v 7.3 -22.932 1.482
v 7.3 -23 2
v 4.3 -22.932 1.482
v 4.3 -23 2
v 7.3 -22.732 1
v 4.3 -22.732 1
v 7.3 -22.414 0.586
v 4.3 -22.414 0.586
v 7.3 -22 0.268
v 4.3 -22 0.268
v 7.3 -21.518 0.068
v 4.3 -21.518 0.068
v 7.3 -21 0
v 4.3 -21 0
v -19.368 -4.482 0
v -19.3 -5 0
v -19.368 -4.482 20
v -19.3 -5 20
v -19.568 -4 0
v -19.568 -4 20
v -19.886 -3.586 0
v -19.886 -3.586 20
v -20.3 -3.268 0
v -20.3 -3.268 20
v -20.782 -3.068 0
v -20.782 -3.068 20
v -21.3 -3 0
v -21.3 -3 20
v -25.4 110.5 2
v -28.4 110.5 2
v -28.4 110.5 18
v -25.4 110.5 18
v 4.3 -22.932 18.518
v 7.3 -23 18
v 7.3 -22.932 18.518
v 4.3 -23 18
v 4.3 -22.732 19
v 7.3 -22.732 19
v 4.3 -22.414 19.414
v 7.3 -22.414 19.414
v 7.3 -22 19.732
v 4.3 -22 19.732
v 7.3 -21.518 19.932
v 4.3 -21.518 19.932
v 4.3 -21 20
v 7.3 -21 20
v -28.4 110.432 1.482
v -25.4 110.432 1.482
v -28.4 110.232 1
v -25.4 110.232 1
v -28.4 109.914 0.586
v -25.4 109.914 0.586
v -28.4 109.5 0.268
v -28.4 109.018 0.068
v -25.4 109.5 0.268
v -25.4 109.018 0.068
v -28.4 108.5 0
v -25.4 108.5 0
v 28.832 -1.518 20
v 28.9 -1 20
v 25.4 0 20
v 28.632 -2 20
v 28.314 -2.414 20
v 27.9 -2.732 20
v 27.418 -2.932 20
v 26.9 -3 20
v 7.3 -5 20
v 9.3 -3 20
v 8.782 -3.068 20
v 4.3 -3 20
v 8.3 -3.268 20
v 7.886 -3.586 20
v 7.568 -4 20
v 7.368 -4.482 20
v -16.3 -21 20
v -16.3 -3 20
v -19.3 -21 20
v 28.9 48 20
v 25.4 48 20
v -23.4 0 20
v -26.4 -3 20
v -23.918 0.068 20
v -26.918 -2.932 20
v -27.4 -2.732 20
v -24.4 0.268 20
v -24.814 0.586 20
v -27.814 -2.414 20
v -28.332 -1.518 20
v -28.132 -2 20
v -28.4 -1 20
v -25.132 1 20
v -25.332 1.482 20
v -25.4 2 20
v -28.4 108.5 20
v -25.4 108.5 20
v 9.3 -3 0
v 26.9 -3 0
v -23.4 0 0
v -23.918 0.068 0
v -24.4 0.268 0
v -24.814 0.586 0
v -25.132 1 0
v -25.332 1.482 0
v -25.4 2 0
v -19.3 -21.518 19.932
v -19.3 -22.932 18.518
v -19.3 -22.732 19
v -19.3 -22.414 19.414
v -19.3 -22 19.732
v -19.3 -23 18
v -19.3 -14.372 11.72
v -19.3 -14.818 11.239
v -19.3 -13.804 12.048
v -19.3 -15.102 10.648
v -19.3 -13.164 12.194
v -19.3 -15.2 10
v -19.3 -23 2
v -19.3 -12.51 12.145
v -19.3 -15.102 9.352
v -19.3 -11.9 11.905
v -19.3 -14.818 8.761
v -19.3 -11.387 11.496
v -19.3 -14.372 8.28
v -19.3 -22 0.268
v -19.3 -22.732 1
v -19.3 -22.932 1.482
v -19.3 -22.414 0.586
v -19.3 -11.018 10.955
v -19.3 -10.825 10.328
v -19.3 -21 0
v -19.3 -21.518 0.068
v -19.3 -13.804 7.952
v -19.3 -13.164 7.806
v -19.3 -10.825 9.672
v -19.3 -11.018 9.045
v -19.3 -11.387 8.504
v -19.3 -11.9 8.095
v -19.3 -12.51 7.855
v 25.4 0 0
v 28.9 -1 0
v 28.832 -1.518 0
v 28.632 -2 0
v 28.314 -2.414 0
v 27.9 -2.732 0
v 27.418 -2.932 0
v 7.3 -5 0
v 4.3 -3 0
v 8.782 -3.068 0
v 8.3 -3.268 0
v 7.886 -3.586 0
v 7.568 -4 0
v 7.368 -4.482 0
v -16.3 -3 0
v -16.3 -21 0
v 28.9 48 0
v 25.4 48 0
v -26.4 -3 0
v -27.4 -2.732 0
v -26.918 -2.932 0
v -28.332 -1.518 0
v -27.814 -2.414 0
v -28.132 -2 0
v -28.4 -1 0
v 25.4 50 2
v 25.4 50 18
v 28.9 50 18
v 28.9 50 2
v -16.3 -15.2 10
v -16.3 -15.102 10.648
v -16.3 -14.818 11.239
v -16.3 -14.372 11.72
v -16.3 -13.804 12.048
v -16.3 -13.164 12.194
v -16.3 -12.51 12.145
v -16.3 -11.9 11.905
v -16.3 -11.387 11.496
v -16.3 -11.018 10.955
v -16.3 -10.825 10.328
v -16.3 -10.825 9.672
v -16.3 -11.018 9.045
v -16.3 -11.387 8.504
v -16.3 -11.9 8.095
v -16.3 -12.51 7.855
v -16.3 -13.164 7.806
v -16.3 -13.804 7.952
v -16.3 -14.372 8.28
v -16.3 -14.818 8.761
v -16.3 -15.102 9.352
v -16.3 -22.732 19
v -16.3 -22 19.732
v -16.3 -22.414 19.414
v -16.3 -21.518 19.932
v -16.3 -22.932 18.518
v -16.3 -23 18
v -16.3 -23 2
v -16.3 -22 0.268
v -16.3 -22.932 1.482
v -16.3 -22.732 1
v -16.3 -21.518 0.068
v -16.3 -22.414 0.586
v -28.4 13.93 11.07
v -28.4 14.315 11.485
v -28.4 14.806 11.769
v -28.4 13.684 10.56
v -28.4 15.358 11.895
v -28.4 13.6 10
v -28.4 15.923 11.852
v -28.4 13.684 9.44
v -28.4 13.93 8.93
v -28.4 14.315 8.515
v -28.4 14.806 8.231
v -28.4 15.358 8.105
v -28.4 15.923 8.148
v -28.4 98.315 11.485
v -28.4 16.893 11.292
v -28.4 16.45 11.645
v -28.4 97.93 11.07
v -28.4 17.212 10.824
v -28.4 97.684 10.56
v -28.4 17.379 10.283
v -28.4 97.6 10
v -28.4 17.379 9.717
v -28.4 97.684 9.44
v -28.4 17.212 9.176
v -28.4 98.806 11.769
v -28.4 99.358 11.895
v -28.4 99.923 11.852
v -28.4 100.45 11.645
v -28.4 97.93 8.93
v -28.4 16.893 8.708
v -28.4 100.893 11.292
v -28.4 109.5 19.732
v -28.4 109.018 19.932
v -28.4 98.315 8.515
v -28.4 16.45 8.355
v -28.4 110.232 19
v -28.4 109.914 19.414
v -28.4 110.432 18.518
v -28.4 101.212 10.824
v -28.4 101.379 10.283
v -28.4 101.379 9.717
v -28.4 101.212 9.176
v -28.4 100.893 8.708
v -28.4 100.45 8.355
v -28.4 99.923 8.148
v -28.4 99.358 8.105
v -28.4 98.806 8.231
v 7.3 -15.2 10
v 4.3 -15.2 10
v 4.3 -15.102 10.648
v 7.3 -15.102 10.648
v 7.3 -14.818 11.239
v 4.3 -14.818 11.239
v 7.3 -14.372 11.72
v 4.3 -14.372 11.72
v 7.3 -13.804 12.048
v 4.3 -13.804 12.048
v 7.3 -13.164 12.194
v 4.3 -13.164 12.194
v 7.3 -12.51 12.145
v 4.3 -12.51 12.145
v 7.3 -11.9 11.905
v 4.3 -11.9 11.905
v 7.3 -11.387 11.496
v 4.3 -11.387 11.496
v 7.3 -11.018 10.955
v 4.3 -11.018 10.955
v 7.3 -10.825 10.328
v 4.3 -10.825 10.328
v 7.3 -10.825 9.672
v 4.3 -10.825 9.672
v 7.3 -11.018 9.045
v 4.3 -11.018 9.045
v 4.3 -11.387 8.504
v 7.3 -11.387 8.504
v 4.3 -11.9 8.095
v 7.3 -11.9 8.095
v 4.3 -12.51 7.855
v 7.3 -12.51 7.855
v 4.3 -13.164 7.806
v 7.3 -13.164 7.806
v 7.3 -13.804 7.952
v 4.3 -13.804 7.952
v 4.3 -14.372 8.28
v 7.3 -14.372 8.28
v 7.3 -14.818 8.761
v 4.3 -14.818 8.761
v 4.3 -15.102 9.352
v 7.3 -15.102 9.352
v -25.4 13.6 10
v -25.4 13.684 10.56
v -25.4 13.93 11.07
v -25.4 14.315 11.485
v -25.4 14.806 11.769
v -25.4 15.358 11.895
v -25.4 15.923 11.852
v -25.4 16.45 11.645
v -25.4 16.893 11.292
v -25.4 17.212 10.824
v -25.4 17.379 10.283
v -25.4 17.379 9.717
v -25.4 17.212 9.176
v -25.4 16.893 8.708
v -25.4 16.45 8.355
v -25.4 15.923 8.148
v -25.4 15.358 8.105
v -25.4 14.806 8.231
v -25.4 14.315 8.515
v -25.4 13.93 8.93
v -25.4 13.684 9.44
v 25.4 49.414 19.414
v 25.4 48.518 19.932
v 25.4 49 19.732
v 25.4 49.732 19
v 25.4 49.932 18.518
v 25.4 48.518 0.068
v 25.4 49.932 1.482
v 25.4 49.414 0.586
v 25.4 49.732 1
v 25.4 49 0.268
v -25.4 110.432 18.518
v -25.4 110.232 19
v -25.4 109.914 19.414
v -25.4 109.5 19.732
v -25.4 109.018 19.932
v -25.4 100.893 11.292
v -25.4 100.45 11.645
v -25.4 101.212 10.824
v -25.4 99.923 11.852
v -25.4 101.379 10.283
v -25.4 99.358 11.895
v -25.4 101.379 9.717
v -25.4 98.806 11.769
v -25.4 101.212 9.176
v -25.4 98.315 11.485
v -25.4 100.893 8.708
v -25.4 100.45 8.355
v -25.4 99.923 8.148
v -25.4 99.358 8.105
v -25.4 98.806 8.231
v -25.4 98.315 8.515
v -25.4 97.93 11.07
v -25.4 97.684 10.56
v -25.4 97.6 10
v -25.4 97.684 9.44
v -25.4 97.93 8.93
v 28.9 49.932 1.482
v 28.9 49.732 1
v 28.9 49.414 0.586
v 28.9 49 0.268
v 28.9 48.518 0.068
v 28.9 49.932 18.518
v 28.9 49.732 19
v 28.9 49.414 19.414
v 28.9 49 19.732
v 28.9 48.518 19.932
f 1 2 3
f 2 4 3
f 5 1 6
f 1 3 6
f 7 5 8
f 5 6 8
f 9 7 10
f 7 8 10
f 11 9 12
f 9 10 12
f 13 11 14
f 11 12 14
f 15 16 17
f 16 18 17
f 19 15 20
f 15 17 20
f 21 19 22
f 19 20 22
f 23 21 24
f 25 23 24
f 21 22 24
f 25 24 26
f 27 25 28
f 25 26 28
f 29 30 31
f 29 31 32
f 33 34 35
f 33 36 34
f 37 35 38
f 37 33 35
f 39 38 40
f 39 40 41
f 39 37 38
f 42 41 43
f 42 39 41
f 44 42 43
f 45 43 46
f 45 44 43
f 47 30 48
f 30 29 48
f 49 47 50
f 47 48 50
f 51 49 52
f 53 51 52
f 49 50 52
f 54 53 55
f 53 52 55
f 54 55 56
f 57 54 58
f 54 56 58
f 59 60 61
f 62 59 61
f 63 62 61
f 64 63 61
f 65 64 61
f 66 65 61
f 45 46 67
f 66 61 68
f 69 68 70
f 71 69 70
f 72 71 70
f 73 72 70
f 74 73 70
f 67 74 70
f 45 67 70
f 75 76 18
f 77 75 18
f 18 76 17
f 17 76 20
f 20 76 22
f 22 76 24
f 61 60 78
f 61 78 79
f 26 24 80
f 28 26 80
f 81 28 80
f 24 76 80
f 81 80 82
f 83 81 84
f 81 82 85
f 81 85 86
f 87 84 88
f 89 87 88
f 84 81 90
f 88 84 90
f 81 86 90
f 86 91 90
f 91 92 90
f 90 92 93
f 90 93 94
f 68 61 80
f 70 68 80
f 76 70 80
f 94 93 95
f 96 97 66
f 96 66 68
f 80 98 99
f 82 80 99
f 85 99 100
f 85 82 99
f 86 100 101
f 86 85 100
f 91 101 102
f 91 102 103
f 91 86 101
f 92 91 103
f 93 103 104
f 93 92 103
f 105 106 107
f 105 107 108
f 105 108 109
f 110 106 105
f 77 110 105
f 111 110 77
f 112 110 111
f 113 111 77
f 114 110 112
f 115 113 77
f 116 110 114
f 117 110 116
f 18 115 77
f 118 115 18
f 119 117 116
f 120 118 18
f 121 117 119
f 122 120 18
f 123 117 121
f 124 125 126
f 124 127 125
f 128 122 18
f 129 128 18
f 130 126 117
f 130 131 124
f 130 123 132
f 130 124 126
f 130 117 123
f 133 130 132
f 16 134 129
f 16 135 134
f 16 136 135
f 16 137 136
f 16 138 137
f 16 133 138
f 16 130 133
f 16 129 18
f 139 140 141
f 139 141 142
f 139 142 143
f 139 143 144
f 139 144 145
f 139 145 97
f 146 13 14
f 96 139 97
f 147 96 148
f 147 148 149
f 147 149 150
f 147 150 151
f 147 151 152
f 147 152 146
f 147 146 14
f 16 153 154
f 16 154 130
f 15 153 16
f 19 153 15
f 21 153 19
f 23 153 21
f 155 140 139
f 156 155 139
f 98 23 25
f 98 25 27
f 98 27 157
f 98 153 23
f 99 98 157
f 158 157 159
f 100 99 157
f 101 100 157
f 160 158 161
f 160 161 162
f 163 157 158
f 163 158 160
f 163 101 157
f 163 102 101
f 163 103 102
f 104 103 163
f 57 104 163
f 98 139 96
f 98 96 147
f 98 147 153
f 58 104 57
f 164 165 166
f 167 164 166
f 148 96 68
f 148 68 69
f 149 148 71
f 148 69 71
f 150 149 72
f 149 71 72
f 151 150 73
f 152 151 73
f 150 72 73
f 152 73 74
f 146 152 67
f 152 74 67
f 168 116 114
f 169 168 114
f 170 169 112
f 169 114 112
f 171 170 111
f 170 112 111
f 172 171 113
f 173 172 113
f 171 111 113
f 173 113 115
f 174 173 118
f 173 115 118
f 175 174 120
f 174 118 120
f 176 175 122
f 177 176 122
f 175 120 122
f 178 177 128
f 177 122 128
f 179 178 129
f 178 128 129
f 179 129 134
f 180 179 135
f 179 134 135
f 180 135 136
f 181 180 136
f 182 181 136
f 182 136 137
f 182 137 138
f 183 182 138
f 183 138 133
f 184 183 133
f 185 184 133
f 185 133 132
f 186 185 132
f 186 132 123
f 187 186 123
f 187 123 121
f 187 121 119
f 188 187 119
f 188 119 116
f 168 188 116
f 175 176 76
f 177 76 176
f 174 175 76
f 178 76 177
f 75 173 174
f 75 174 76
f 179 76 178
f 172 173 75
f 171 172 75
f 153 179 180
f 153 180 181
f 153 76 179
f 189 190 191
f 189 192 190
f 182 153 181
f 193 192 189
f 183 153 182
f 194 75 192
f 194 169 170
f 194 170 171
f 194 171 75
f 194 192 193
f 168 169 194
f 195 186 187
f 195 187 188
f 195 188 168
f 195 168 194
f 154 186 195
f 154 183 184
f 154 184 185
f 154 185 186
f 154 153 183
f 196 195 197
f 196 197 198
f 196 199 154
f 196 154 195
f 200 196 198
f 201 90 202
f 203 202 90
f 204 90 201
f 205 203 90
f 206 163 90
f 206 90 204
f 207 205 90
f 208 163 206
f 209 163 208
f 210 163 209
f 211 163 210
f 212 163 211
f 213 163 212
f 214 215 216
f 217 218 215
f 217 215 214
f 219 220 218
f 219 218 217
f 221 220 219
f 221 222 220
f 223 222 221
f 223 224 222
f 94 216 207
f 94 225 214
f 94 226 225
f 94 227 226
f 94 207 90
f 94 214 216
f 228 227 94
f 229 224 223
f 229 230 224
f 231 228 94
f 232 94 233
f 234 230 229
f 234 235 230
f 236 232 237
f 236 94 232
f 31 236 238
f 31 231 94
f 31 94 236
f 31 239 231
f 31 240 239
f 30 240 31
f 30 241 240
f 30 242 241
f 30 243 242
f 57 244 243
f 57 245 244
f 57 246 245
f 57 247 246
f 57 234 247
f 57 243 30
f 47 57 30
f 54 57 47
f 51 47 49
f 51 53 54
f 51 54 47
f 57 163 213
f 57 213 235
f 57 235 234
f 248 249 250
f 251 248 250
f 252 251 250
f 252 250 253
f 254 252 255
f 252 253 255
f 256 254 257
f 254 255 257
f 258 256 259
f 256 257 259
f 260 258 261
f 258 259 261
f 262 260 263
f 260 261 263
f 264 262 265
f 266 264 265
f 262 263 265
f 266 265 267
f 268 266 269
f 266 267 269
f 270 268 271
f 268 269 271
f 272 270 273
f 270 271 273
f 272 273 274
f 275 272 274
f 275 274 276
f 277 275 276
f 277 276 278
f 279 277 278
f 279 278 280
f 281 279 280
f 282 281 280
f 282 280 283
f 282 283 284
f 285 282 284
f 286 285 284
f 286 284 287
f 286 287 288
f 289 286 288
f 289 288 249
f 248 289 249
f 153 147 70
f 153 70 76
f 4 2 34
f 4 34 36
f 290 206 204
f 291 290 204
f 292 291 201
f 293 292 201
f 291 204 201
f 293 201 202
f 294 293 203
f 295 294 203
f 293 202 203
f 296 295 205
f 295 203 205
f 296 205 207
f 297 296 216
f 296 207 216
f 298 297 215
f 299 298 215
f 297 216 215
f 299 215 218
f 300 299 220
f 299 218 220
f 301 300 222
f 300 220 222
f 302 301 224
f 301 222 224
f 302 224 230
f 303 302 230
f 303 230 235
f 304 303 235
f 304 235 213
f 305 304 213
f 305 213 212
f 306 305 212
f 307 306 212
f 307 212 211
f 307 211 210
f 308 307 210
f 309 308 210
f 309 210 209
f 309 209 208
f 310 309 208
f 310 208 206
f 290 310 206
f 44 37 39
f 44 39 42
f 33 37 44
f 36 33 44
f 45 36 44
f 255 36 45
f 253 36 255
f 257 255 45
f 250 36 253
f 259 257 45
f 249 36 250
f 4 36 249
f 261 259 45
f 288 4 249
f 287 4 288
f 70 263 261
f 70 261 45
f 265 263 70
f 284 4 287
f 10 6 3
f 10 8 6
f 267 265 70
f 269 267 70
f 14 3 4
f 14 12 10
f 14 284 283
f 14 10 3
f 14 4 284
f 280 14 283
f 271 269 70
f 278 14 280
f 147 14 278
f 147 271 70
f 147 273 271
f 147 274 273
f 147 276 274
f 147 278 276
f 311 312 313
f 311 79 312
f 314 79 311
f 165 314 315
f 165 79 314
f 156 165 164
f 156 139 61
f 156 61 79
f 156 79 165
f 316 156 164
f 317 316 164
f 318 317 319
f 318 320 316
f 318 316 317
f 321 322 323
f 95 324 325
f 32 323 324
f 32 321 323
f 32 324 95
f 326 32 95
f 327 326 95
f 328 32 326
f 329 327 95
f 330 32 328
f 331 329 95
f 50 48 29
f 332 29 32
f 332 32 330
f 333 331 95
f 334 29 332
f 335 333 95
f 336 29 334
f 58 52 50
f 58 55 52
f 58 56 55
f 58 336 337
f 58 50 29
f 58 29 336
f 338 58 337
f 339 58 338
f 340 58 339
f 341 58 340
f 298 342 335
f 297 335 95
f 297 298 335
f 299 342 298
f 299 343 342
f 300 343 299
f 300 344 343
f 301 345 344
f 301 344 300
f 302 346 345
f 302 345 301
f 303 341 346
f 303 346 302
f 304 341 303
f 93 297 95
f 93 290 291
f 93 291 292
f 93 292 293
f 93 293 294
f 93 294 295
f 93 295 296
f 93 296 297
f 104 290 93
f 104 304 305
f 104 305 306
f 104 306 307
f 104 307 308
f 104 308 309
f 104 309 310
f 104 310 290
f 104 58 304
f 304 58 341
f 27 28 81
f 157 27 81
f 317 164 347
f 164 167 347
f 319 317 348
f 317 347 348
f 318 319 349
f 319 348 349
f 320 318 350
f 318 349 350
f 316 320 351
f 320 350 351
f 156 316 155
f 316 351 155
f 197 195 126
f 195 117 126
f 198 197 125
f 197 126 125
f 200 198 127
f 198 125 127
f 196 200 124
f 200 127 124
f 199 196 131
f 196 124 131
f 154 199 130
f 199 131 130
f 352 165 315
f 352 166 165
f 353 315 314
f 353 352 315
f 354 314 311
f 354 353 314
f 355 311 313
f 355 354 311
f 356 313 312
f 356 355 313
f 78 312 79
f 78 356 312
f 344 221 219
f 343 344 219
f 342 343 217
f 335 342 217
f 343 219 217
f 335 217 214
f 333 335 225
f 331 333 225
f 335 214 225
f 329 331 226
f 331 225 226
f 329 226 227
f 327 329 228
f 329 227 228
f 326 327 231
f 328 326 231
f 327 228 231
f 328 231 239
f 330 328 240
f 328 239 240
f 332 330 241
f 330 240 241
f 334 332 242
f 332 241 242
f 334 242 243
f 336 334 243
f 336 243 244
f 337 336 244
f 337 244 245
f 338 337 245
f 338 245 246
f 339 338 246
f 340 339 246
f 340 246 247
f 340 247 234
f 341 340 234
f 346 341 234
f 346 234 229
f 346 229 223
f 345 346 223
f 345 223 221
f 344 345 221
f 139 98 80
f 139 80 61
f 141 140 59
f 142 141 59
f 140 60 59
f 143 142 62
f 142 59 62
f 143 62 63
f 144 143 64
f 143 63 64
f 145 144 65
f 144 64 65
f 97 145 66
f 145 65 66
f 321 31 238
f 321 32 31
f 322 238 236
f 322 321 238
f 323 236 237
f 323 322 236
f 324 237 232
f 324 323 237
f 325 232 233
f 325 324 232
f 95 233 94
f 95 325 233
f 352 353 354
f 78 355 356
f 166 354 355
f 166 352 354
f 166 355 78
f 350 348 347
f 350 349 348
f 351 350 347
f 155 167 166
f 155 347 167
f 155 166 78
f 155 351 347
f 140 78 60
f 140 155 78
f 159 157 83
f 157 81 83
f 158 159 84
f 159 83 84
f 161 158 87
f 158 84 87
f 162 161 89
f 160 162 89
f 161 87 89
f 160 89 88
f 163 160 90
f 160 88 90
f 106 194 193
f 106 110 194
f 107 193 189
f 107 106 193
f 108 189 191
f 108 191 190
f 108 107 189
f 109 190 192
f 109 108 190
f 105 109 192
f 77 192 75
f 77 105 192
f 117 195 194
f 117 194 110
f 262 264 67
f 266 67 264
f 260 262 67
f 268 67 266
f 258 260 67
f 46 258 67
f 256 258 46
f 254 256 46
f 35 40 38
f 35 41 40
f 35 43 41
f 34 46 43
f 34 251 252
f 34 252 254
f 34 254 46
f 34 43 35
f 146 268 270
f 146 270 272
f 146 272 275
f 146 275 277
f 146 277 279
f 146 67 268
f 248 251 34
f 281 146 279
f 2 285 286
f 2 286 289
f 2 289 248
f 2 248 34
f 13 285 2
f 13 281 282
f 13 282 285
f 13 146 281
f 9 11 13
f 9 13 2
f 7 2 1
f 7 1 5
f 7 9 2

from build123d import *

# Parameters (mm, degrees)
BOSS_EXTRUDE1_DEPTH = 20
FILLET1_R           = 2
SKETCH2_R           = 1.9
SKETCH2_R_2         = 2.2
CUT_EXTRUDE1_DEPTH  = 40


with BuildPart() as part:
    # Sketch1 → Boss-Extrude1 (new body)
    with BuildSketch(Plane.XY):
        Polygon((-25.4, 0), (25.4, 0), (25.4, 50), (28.9, 50), (28.9, -3), (7.3, -3), (7.3, -23), (4.3, -23), (4.3, -3), (-16.3, -3), (-16.3, -23), (-19.3, -23), (-19.3, -3), (-28.4, -3), (-28.4, 110.5), (-25.4, 110.5), align=None)
    extrude(amount=BOSS_EXTRUDE1_DEPTH)

    # Fillet1
    fillet1_edges = [part.edges().sort_by_distance(p)[0] for p in [
        (27.15, 50, 0),
        (5.8, -23, 0),
        (-17.8, -23, 0),
        (-17.8, -23, 20),
        (-26.9, 110.5, 0),
        (-25.4, 0, 10),
        (28.9, -3, 10),
        (7.3, -3, 10),
        (-19.3, -3, 10),
        (-28.4, -3, 10),
        (5.8, -23, 20),
        (27.15, 50, 20),
        (-26.9, 110.5, 20),
    ]]
    fillet(fillet1_edges, radius=FILLET1_R)

    # Sketch2 → Cut-Extrude1 (cut)
    with BuildSketch(Plane.ZY.offset(28.4)):
        with Locations(Location((10, 99.5, 0), (0, 0, 270))):
            Circle(SKETCH2_R)
        with Locations(Location((10, 15.5, 0), (0, 0, 270))):
            Circle(SKETCH2_R)
        with Locations(Location((10, -13, 0), (0, 0, 270))):
            Circle(SKETCH2_R_2)
    extrude(amount=-CUT_EXTRUDE1_DEPTH, mode=Mode.SUBTRACT)


solid = part.part
